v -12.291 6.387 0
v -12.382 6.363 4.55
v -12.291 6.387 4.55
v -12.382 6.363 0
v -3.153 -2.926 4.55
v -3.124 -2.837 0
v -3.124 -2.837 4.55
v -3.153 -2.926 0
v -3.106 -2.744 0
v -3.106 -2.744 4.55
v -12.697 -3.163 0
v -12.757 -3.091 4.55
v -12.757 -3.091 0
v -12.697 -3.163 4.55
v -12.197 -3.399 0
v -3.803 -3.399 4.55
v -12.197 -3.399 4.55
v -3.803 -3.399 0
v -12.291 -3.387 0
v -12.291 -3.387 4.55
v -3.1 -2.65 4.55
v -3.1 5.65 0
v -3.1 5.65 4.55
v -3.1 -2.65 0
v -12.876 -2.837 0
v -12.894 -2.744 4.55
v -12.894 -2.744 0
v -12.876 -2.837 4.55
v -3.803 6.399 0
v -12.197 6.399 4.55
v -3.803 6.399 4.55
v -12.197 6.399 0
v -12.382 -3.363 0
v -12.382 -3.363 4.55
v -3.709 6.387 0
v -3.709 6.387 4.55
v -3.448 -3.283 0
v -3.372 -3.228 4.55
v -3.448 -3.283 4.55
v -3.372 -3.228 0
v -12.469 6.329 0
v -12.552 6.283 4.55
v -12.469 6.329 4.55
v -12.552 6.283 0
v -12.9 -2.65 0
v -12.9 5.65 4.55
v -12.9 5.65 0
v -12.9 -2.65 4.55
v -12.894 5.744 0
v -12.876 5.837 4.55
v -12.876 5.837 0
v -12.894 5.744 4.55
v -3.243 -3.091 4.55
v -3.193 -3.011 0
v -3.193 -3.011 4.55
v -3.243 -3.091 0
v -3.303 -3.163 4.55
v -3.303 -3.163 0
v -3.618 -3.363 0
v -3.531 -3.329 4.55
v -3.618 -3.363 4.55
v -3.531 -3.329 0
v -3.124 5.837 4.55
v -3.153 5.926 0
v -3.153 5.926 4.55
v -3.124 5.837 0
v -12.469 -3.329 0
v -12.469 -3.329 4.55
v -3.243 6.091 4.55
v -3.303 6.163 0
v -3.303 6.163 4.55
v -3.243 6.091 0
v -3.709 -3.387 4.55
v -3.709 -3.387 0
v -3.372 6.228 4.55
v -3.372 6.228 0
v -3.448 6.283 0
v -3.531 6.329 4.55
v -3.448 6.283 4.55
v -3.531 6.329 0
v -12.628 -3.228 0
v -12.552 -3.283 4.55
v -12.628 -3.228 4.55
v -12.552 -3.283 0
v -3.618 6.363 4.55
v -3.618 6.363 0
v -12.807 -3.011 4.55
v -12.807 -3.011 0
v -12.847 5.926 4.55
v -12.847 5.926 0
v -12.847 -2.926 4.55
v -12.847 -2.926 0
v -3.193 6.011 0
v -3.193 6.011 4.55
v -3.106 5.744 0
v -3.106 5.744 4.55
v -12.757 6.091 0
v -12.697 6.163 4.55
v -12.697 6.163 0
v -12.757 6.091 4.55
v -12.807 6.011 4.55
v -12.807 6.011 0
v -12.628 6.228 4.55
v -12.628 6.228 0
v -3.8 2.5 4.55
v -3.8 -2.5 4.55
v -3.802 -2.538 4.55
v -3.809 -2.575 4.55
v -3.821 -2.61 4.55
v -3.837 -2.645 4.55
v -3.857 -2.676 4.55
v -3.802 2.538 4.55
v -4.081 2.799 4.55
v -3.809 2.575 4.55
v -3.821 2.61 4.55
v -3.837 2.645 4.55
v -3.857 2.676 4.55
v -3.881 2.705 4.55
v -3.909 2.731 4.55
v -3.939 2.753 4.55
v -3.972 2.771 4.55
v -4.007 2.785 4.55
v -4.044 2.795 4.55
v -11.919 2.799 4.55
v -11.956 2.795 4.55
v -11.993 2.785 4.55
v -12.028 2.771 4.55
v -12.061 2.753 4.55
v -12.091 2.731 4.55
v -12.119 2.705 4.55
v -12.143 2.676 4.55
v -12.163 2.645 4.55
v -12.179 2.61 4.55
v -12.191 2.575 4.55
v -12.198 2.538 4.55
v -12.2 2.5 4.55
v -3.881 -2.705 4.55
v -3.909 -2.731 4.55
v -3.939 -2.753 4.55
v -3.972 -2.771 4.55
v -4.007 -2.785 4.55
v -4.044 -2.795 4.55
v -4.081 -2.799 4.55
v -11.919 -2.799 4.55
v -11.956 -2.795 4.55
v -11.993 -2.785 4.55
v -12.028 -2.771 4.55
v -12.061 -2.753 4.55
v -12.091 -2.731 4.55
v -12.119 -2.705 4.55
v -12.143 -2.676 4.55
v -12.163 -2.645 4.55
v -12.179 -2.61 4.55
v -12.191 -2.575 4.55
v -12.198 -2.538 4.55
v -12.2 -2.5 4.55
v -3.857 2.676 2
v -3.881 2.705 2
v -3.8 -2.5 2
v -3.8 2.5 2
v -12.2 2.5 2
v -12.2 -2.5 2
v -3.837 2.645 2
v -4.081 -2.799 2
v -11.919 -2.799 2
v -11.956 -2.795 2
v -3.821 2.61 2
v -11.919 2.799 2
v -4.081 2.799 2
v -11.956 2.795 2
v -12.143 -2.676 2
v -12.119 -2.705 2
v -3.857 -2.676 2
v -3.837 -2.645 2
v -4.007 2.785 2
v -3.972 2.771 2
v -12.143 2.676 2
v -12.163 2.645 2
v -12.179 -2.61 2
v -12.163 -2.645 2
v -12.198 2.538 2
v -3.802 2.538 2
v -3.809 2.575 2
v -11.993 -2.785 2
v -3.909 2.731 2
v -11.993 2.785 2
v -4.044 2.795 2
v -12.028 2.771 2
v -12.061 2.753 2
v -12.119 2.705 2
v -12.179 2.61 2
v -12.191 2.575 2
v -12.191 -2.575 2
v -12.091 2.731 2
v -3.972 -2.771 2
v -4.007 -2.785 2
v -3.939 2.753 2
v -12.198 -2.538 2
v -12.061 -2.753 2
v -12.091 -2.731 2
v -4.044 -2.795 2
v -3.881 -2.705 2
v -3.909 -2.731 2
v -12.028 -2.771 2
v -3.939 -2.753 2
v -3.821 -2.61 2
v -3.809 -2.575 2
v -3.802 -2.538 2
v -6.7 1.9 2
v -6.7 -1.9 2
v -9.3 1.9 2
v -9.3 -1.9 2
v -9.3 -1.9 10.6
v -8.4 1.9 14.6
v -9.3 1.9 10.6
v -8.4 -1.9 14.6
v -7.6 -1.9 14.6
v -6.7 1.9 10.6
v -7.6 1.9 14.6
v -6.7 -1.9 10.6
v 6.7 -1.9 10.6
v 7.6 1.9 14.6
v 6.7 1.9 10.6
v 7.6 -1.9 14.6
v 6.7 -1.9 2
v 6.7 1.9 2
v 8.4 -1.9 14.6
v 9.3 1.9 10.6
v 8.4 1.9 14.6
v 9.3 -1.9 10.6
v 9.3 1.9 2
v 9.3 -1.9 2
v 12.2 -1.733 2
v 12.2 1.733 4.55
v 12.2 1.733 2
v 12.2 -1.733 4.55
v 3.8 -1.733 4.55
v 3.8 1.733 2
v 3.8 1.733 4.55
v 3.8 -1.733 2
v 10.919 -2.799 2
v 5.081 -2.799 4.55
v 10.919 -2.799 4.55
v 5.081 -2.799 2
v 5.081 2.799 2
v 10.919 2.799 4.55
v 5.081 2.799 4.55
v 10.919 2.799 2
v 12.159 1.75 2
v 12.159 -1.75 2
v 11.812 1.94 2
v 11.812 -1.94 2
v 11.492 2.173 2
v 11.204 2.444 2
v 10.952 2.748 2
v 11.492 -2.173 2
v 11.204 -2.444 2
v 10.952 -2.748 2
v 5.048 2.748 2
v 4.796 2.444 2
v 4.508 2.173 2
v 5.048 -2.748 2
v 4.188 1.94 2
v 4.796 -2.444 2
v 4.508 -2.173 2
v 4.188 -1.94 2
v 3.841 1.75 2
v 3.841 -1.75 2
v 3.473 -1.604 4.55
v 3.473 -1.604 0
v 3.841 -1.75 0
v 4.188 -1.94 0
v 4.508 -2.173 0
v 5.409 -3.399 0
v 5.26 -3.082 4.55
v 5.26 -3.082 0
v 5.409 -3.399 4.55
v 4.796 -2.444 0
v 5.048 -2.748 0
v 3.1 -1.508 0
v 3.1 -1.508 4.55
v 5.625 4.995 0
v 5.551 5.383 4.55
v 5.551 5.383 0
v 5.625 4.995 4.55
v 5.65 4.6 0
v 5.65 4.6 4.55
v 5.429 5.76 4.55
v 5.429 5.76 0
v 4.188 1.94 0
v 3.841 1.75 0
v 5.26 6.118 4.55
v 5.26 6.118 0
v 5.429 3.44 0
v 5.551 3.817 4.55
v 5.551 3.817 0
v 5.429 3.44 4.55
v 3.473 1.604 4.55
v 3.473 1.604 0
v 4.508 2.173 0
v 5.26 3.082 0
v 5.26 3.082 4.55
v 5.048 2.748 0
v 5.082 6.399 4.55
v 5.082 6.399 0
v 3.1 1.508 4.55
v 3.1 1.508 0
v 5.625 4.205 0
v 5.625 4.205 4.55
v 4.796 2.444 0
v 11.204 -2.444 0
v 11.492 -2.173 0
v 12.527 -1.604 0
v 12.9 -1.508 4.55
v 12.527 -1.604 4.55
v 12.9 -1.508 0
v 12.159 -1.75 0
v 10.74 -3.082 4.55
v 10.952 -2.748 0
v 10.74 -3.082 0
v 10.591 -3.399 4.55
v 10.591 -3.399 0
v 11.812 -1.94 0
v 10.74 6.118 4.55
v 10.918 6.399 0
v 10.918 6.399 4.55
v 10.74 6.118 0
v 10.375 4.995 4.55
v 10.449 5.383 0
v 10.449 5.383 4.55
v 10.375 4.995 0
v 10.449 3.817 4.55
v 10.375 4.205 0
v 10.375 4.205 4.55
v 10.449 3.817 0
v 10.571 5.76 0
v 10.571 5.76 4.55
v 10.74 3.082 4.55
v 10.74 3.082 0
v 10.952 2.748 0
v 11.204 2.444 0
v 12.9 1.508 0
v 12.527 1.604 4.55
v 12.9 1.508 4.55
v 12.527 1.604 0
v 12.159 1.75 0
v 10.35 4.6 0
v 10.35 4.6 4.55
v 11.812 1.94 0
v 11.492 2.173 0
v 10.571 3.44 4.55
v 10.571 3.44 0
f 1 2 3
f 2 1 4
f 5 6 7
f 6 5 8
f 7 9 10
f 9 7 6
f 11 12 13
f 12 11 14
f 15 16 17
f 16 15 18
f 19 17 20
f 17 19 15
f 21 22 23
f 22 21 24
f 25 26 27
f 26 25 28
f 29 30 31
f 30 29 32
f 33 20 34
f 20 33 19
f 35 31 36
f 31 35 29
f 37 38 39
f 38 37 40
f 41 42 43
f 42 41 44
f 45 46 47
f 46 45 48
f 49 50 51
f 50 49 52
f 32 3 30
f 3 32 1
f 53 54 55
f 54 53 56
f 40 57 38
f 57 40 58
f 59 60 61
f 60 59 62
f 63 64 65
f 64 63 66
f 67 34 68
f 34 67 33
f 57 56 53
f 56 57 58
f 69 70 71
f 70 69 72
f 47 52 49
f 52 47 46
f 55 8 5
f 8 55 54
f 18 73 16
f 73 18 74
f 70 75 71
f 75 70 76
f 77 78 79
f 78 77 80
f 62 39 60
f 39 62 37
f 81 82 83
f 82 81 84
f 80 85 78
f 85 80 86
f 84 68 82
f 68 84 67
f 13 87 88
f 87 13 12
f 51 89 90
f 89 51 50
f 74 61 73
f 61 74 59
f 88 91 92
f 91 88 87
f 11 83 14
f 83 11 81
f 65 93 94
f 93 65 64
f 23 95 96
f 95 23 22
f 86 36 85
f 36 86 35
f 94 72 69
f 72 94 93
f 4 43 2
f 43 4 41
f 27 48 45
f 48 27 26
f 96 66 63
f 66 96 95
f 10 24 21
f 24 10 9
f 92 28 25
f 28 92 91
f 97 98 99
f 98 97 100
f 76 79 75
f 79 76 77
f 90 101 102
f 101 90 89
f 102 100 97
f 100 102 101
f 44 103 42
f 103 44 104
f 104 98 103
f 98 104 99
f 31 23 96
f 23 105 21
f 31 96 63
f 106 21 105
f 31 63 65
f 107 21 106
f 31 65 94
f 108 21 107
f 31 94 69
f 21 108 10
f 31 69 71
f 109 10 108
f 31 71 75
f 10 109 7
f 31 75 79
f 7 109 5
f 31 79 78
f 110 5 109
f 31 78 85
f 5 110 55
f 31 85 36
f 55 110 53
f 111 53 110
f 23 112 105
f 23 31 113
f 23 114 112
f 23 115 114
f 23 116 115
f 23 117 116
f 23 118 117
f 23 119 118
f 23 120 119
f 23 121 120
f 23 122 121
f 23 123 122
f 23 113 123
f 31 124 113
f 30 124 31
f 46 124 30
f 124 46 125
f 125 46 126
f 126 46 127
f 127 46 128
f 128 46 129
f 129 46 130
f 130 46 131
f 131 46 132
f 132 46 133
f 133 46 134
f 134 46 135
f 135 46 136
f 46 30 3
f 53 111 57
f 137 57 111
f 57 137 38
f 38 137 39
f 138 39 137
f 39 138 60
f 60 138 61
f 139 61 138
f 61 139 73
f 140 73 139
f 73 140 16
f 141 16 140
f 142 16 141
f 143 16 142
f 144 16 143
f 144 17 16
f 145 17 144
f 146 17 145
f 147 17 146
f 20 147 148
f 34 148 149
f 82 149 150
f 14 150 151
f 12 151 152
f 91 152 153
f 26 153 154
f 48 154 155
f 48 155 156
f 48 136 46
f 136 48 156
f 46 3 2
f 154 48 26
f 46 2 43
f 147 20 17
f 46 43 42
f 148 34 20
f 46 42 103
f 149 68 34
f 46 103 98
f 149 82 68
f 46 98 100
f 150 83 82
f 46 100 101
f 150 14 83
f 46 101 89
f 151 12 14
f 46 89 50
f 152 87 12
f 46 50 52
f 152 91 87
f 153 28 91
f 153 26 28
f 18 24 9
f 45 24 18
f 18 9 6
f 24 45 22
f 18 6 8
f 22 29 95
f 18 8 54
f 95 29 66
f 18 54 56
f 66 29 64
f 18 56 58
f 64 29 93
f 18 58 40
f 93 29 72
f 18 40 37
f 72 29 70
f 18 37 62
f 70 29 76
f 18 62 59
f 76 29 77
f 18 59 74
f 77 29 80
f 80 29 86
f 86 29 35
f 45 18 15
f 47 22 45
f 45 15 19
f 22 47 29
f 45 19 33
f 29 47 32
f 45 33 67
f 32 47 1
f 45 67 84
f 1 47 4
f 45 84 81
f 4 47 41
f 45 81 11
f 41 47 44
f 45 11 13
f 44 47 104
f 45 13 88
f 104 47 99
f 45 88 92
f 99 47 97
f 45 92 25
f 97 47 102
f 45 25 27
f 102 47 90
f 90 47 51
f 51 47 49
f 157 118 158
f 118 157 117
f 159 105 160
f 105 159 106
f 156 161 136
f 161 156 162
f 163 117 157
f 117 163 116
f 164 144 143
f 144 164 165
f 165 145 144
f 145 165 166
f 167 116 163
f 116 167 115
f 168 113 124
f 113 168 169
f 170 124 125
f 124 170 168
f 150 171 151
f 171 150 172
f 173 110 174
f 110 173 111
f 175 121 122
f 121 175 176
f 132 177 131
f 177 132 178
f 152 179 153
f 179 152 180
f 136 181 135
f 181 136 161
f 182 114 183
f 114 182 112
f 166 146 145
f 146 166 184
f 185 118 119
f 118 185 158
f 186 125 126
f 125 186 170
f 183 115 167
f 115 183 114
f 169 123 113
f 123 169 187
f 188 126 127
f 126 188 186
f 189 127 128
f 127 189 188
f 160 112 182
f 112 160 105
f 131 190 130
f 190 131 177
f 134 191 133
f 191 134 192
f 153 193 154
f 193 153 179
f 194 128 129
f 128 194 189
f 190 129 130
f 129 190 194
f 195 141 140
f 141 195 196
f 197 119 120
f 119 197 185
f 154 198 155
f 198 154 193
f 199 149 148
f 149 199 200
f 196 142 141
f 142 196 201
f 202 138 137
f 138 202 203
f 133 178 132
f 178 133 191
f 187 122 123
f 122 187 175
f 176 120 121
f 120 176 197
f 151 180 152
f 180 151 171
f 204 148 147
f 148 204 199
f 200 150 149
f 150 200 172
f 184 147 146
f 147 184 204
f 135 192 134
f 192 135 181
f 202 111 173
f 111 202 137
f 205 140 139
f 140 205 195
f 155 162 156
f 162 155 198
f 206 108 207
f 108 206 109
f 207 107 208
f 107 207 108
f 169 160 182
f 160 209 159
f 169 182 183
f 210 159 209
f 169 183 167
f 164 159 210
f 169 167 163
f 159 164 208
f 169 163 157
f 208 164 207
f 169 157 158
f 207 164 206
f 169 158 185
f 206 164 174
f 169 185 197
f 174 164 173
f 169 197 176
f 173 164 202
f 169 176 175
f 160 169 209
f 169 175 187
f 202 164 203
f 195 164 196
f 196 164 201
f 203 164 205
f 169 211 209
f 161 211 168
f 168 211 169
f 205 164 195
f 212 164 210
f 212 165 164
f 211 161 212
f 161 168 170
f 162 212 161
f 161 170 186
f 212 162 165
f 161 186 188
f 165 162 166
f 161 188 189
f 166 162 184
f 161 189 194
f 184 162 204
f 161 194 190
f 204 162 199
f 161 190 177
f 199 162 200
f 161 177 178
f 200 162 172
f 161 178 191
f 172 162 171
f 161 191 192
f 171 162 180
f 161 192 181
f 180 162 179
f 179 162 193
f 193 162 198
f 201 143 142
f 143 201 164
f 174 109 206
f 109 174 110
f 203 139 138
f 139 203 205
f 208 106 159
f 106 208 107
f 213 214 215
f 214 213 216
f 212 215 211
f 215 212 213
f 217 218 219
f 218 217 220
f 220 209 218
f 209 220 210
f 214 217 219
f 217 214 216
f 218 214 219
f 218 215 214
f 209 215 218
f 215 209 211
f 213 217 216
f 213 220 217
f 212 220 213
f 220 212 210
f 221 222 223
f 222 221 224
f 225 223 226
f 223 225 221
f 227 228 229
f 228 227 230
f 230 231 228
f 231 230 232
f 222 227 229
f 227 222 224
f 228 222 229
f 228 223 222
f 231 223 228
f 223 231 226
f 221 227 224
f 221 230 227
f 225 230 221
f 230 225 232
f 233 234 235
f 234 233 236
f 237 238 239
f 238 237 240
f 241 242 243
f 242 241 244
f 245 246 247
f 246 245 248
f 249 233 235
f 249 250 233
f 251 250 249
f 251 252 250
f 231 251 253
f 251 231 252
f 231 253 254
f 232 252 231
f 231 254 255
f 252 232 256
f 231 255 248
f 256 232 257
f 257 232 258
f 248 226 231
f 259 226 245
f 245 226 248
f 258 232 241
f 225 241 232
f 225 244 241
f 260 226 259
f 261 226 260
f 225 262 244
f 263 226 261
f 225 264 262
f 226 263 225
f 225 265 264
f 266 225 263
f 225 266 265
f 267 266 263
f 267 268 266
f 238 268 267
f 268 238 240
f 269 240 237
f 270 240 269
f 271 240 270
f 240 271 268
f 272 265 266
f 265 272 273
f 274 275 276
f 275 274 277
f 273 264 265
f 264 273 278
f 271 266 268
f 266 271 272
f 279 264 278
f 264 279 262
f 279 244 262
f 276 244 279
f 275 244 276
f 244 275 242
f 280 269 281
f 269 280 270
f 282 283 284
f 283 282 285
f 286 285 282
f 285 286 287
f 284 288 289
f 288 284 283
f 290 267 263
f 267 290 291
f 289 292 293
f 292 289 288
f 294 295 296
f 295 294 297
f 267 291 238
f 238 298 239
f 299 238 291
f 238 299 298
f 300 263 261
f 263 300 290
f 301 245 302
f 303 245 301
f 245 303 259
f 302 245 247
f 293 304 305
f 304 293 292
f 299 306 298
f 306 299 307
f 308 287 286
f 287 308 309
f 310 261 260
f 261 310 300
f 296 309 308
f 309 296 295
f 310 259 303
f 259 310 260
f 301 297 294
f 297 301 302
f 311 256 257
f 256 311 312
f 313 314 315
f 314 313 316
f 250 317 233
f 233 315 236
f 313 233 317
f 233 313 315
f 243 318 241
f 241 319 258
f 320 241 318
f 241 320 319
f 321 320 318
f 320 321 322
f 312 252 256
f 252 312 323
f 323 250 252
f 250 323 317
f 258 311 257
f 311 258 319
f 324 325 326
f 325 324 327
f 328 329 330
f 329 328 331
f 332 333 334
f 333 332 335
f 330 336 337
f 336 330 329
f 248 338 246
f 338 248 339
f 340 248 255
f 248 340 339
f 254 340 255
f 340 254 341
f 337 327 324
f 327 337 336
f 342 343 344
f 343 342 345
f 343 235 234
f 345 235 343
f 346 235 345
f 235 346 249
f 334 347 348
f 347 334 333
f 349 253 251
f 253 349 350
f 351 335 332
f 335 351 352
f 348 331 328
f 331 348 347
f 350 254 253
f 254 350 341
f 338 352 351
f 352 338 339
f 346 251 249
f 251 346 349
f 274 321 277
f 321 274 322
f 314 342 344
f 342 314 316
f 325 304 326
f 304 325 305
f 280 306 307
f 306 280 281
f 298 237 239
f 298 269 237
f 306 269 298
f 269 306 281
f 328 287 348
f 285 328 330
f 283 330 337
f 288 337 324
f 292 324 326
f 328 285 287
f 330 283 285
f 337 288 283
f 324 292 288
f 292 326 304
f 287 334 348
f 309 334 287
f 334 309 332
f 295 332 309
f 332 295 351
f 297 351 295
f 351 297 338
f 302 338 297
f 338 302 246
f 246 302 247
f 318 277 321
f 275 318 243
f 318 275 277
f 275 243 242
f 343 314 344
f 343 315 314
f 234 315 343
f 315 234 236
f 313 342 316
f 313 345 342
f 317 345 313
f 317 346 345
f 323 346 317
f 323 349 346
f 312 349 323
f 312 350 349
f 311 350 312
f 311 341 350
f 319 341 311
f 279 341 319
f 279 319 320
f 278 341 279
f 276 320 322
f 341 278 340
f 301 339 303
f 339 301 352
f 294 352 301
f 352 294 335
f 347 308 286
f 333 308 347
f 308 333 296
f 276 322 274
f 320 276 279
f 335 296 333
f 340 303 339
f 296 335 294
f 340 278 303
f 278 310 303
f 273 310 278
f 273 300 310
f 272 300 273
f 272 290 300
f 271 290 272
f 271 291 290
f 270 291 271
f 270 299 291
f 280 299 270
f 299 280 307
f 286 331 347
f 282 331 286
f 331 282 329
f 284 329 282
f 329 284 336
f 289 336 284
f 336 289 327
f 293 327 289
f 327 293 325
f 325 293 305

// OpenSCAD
translate([-8,0,0]) { 
// Archived geometry from ../../../validation_v7_joiner_extrusion/previous_current/parts/oobb_organization_storage_drawer_unit_rectangle_100_ml_tamper_evident_systempak_209_container_1_column_2_row_ai_version_7_style_unit_1_wide_2_tall/front_plug_square.scad
$fn = 50;

difference() {
	union() {
		translate(v = [0, 0, 0]) {
			rotate(a = [0, 0, 0]) {
				difference() {
					union() {
						translate(v = [0, 0, 0]) {
							rotate(a = [0, 0, 0]) {
								difference() {
									union() {
										translate(v = [0, 0, 0]) {
											rotate(a = [0, 0, 0]) {
												difference() {
													union() {
														translate(v = [0, 1.5, 0]) {
															hull() {
																translate(v = [-4.15, 4.15, 0]) {
																	cylinder(h = 4.55, r = 0.75);
																}
																translate(v = [4.15, 4.15, 0]) {
																	cylinder(h = 4.55, r = 0.75);
																}
																translate(v = [-4.15, -4.15, 0]) {
																	cylinder(h = 4.55, r = 0.75);
																}
																translate(v = [4.15, -4.15, 0]) {
																	cylinder(h = 4.55, r = 0.75);
																}
															}
														}
													}
													union() {
														translate(v = [0, 0, 2.0]) {
															hull() {
																translate(v = [-3.9000000000000004, 2.5, 0]) {
																	cylinder(h = 2.65, r = 0.3);
																}
																translate(v = [3.9000000000000004, 2.5, 0]) {
																	cylinder(h = 2.65, r = 0.3);
																}
																translate(v = [-3.9000000000000004, -2.5, 0]) {
																	cylinder(h = 2.65, r = 0.3);
																}
																translate(v = [3.9000000000000004, -2.5, 0]) {
																	cylinder(h = 2.65, r = 0.3);
																}
															}
														}
													}
												}
											}
										}
										translate(v = [0, 0, 0]) {
											rotate(a = [0, 0, 0]) {
												difference() {
													union() {
														translate(v = [-1.4000000000000001, -1.9, 1.95]) {
															cube(size = [2.8000000000000003, 3.8, 12.65]);
														}
													}
													union() {
														translate(v = [0, 2.0, 0]) {
															rotate(a = [90, 0, 0]) {
																linear_extrude(height = 4.0) {
																	polygon(points = [[-1.3, 1.85], [-1.3, 10.6], [-0.4, 14.6], [-0.4, 14.799999999999999], [-1.6, 14.799999999999999], [-1.6, 1.85]]);
																}
															}
														}
														translate(v = [0, 2.0, 0]) {
															rotate(a = [90, 0, 0]) {
																linear_extrude(height = 4.0) {
																	polygon(points = [[1.3, 1.85], [1.3, 10.6], [0.4, 14.6], [0.4, 14.799999999999999], [1.6, 14.799999999999999], [1.6, 1.85]]);
																}
															}
														}
													}
												}
											}
										}
									}
									union();
								}
							}
						}
					}
					union();
				}
			}
		}
	}
	union();
}
 }
translate([8,0,0]) { 
// Archived geometry from ../../../validation_v7_joiner_extrusion/previous_current/parts/oobb_organization_storage_drawer_unit_rectangle_100_ml_tamper_evident_systempak_209_container_1_column_2_row_ai_version_7_style_unit_1_wide_2_tall/front_plug.scad
$fn = 50;

difference() {
	union() {
		translate(v = [0, 0, 0]) {
			rotate(a = [0, 0, 0]) {
				difference() {
					union() {
						translate(v = [0, 0, 0]) {
							rotate(a = [0, 0, 0]) {
								difference() {
									union() {
										translate(v = [0, 0, 0]) {
											rotate(a = [0, 0, 0]) {
												difference() {
													union() {
														translate(v = [0, 1.5, 0]) {
															hull() {
																translate(v = [-4.15, 4.15, 0]) {
																	cylinder(h = 4.55, r = 0.75);
																}
																translate(v = [4.15, 4.15, 0]) {
																	cylinder(h = 4.55, r = 0.75);
																}
																translate(v = [-4.15, -4.15, 0]) {
																	cylinder(h = 4.55, r = 0.75);
																}
																translate(v = [4.15, -4.15, 0]) {
																	cylinder(h = 4.55, r = 0.75);
																}
															}
														}
													}
													union() {
														translate(v = [0, 0, 2.0]) {
															hull() {
																translate(v = [-3.9000000000000004, 2.5, 0]) {
																	cylinder(h = 2.65, r = 0.3);
																}
																translate(v = [3.9000000000000004, 2.5, 0]) {
																	cylinder(h = 2.65, r = 0.3);
																}
																translate(v = [-3.9000000000000004, -2.5, 0]) {
																	cylinder(h = 2.65, r = 0.3);
																}
																translate(v = [3.9000000000000004, -2.5, 0]) {
																	cylinder(h = 2.65, r = 0.3);
																}
															}
														}
														translate(v = [-5.5, -4.6, -0.1]) {
															cylinder(h = 4.75, r = 3.15);
														}
														translate(v = [-5.5, 4.6, -0.1]) {
															cylinder(h = 4.75, r = 3.15);
														}
														translate(v = [5.5, -4.6, -0.1]) {
															cylinder(h = 4.75, r = 3.15);
														}
														translate(v = [5.5, 4.6, -0.1]) {
															cylinder(h = 4.75, r = 3.15);
														}
													}
												}
											}
										}
										translate(v = [0, 0, 0]) {
											rotate(a = [0, 0, 0]) {
												difference() {
													union() {
														translate(v = [-1.4000000000000001, -1.9, 1.95]) {
															cube(size = [2.8000000000000003, 3.8, 12.65]);
														}
													}
													union() {
														translate(v = [0, 2.0, 0]) {
															rotate(a = [90, 0, 0]) {
																linear_extrude(height = 4.0) {
																	polygon(points = [[-1.3, 1.85], [-1.3, 10.6], [-0.4, 14.6], [-0.4, 14.799999999999999], [-1.6, 14.799999999999999], [-1.6, 1.85]]);
																}
															}
														}
														translate(v = [0, 2.0, 0]) {
															rotate(a = [90, 0, 0]) {
																linear_extrude(height = 4.0) {
																	polygon(points = [[1.3, 1.85], [1.3, 10.6], [0.4, 14.6], [0.4, 14.799999999999999], [1.6, 14.799999999999999], [1.6, 1.85]]);
																}
															}
														}
													}
												}
											}
										}
									}
									union();
								}
							}
						}
					}
					union();
				}
			}
		}
	}
	union();
}
 }
